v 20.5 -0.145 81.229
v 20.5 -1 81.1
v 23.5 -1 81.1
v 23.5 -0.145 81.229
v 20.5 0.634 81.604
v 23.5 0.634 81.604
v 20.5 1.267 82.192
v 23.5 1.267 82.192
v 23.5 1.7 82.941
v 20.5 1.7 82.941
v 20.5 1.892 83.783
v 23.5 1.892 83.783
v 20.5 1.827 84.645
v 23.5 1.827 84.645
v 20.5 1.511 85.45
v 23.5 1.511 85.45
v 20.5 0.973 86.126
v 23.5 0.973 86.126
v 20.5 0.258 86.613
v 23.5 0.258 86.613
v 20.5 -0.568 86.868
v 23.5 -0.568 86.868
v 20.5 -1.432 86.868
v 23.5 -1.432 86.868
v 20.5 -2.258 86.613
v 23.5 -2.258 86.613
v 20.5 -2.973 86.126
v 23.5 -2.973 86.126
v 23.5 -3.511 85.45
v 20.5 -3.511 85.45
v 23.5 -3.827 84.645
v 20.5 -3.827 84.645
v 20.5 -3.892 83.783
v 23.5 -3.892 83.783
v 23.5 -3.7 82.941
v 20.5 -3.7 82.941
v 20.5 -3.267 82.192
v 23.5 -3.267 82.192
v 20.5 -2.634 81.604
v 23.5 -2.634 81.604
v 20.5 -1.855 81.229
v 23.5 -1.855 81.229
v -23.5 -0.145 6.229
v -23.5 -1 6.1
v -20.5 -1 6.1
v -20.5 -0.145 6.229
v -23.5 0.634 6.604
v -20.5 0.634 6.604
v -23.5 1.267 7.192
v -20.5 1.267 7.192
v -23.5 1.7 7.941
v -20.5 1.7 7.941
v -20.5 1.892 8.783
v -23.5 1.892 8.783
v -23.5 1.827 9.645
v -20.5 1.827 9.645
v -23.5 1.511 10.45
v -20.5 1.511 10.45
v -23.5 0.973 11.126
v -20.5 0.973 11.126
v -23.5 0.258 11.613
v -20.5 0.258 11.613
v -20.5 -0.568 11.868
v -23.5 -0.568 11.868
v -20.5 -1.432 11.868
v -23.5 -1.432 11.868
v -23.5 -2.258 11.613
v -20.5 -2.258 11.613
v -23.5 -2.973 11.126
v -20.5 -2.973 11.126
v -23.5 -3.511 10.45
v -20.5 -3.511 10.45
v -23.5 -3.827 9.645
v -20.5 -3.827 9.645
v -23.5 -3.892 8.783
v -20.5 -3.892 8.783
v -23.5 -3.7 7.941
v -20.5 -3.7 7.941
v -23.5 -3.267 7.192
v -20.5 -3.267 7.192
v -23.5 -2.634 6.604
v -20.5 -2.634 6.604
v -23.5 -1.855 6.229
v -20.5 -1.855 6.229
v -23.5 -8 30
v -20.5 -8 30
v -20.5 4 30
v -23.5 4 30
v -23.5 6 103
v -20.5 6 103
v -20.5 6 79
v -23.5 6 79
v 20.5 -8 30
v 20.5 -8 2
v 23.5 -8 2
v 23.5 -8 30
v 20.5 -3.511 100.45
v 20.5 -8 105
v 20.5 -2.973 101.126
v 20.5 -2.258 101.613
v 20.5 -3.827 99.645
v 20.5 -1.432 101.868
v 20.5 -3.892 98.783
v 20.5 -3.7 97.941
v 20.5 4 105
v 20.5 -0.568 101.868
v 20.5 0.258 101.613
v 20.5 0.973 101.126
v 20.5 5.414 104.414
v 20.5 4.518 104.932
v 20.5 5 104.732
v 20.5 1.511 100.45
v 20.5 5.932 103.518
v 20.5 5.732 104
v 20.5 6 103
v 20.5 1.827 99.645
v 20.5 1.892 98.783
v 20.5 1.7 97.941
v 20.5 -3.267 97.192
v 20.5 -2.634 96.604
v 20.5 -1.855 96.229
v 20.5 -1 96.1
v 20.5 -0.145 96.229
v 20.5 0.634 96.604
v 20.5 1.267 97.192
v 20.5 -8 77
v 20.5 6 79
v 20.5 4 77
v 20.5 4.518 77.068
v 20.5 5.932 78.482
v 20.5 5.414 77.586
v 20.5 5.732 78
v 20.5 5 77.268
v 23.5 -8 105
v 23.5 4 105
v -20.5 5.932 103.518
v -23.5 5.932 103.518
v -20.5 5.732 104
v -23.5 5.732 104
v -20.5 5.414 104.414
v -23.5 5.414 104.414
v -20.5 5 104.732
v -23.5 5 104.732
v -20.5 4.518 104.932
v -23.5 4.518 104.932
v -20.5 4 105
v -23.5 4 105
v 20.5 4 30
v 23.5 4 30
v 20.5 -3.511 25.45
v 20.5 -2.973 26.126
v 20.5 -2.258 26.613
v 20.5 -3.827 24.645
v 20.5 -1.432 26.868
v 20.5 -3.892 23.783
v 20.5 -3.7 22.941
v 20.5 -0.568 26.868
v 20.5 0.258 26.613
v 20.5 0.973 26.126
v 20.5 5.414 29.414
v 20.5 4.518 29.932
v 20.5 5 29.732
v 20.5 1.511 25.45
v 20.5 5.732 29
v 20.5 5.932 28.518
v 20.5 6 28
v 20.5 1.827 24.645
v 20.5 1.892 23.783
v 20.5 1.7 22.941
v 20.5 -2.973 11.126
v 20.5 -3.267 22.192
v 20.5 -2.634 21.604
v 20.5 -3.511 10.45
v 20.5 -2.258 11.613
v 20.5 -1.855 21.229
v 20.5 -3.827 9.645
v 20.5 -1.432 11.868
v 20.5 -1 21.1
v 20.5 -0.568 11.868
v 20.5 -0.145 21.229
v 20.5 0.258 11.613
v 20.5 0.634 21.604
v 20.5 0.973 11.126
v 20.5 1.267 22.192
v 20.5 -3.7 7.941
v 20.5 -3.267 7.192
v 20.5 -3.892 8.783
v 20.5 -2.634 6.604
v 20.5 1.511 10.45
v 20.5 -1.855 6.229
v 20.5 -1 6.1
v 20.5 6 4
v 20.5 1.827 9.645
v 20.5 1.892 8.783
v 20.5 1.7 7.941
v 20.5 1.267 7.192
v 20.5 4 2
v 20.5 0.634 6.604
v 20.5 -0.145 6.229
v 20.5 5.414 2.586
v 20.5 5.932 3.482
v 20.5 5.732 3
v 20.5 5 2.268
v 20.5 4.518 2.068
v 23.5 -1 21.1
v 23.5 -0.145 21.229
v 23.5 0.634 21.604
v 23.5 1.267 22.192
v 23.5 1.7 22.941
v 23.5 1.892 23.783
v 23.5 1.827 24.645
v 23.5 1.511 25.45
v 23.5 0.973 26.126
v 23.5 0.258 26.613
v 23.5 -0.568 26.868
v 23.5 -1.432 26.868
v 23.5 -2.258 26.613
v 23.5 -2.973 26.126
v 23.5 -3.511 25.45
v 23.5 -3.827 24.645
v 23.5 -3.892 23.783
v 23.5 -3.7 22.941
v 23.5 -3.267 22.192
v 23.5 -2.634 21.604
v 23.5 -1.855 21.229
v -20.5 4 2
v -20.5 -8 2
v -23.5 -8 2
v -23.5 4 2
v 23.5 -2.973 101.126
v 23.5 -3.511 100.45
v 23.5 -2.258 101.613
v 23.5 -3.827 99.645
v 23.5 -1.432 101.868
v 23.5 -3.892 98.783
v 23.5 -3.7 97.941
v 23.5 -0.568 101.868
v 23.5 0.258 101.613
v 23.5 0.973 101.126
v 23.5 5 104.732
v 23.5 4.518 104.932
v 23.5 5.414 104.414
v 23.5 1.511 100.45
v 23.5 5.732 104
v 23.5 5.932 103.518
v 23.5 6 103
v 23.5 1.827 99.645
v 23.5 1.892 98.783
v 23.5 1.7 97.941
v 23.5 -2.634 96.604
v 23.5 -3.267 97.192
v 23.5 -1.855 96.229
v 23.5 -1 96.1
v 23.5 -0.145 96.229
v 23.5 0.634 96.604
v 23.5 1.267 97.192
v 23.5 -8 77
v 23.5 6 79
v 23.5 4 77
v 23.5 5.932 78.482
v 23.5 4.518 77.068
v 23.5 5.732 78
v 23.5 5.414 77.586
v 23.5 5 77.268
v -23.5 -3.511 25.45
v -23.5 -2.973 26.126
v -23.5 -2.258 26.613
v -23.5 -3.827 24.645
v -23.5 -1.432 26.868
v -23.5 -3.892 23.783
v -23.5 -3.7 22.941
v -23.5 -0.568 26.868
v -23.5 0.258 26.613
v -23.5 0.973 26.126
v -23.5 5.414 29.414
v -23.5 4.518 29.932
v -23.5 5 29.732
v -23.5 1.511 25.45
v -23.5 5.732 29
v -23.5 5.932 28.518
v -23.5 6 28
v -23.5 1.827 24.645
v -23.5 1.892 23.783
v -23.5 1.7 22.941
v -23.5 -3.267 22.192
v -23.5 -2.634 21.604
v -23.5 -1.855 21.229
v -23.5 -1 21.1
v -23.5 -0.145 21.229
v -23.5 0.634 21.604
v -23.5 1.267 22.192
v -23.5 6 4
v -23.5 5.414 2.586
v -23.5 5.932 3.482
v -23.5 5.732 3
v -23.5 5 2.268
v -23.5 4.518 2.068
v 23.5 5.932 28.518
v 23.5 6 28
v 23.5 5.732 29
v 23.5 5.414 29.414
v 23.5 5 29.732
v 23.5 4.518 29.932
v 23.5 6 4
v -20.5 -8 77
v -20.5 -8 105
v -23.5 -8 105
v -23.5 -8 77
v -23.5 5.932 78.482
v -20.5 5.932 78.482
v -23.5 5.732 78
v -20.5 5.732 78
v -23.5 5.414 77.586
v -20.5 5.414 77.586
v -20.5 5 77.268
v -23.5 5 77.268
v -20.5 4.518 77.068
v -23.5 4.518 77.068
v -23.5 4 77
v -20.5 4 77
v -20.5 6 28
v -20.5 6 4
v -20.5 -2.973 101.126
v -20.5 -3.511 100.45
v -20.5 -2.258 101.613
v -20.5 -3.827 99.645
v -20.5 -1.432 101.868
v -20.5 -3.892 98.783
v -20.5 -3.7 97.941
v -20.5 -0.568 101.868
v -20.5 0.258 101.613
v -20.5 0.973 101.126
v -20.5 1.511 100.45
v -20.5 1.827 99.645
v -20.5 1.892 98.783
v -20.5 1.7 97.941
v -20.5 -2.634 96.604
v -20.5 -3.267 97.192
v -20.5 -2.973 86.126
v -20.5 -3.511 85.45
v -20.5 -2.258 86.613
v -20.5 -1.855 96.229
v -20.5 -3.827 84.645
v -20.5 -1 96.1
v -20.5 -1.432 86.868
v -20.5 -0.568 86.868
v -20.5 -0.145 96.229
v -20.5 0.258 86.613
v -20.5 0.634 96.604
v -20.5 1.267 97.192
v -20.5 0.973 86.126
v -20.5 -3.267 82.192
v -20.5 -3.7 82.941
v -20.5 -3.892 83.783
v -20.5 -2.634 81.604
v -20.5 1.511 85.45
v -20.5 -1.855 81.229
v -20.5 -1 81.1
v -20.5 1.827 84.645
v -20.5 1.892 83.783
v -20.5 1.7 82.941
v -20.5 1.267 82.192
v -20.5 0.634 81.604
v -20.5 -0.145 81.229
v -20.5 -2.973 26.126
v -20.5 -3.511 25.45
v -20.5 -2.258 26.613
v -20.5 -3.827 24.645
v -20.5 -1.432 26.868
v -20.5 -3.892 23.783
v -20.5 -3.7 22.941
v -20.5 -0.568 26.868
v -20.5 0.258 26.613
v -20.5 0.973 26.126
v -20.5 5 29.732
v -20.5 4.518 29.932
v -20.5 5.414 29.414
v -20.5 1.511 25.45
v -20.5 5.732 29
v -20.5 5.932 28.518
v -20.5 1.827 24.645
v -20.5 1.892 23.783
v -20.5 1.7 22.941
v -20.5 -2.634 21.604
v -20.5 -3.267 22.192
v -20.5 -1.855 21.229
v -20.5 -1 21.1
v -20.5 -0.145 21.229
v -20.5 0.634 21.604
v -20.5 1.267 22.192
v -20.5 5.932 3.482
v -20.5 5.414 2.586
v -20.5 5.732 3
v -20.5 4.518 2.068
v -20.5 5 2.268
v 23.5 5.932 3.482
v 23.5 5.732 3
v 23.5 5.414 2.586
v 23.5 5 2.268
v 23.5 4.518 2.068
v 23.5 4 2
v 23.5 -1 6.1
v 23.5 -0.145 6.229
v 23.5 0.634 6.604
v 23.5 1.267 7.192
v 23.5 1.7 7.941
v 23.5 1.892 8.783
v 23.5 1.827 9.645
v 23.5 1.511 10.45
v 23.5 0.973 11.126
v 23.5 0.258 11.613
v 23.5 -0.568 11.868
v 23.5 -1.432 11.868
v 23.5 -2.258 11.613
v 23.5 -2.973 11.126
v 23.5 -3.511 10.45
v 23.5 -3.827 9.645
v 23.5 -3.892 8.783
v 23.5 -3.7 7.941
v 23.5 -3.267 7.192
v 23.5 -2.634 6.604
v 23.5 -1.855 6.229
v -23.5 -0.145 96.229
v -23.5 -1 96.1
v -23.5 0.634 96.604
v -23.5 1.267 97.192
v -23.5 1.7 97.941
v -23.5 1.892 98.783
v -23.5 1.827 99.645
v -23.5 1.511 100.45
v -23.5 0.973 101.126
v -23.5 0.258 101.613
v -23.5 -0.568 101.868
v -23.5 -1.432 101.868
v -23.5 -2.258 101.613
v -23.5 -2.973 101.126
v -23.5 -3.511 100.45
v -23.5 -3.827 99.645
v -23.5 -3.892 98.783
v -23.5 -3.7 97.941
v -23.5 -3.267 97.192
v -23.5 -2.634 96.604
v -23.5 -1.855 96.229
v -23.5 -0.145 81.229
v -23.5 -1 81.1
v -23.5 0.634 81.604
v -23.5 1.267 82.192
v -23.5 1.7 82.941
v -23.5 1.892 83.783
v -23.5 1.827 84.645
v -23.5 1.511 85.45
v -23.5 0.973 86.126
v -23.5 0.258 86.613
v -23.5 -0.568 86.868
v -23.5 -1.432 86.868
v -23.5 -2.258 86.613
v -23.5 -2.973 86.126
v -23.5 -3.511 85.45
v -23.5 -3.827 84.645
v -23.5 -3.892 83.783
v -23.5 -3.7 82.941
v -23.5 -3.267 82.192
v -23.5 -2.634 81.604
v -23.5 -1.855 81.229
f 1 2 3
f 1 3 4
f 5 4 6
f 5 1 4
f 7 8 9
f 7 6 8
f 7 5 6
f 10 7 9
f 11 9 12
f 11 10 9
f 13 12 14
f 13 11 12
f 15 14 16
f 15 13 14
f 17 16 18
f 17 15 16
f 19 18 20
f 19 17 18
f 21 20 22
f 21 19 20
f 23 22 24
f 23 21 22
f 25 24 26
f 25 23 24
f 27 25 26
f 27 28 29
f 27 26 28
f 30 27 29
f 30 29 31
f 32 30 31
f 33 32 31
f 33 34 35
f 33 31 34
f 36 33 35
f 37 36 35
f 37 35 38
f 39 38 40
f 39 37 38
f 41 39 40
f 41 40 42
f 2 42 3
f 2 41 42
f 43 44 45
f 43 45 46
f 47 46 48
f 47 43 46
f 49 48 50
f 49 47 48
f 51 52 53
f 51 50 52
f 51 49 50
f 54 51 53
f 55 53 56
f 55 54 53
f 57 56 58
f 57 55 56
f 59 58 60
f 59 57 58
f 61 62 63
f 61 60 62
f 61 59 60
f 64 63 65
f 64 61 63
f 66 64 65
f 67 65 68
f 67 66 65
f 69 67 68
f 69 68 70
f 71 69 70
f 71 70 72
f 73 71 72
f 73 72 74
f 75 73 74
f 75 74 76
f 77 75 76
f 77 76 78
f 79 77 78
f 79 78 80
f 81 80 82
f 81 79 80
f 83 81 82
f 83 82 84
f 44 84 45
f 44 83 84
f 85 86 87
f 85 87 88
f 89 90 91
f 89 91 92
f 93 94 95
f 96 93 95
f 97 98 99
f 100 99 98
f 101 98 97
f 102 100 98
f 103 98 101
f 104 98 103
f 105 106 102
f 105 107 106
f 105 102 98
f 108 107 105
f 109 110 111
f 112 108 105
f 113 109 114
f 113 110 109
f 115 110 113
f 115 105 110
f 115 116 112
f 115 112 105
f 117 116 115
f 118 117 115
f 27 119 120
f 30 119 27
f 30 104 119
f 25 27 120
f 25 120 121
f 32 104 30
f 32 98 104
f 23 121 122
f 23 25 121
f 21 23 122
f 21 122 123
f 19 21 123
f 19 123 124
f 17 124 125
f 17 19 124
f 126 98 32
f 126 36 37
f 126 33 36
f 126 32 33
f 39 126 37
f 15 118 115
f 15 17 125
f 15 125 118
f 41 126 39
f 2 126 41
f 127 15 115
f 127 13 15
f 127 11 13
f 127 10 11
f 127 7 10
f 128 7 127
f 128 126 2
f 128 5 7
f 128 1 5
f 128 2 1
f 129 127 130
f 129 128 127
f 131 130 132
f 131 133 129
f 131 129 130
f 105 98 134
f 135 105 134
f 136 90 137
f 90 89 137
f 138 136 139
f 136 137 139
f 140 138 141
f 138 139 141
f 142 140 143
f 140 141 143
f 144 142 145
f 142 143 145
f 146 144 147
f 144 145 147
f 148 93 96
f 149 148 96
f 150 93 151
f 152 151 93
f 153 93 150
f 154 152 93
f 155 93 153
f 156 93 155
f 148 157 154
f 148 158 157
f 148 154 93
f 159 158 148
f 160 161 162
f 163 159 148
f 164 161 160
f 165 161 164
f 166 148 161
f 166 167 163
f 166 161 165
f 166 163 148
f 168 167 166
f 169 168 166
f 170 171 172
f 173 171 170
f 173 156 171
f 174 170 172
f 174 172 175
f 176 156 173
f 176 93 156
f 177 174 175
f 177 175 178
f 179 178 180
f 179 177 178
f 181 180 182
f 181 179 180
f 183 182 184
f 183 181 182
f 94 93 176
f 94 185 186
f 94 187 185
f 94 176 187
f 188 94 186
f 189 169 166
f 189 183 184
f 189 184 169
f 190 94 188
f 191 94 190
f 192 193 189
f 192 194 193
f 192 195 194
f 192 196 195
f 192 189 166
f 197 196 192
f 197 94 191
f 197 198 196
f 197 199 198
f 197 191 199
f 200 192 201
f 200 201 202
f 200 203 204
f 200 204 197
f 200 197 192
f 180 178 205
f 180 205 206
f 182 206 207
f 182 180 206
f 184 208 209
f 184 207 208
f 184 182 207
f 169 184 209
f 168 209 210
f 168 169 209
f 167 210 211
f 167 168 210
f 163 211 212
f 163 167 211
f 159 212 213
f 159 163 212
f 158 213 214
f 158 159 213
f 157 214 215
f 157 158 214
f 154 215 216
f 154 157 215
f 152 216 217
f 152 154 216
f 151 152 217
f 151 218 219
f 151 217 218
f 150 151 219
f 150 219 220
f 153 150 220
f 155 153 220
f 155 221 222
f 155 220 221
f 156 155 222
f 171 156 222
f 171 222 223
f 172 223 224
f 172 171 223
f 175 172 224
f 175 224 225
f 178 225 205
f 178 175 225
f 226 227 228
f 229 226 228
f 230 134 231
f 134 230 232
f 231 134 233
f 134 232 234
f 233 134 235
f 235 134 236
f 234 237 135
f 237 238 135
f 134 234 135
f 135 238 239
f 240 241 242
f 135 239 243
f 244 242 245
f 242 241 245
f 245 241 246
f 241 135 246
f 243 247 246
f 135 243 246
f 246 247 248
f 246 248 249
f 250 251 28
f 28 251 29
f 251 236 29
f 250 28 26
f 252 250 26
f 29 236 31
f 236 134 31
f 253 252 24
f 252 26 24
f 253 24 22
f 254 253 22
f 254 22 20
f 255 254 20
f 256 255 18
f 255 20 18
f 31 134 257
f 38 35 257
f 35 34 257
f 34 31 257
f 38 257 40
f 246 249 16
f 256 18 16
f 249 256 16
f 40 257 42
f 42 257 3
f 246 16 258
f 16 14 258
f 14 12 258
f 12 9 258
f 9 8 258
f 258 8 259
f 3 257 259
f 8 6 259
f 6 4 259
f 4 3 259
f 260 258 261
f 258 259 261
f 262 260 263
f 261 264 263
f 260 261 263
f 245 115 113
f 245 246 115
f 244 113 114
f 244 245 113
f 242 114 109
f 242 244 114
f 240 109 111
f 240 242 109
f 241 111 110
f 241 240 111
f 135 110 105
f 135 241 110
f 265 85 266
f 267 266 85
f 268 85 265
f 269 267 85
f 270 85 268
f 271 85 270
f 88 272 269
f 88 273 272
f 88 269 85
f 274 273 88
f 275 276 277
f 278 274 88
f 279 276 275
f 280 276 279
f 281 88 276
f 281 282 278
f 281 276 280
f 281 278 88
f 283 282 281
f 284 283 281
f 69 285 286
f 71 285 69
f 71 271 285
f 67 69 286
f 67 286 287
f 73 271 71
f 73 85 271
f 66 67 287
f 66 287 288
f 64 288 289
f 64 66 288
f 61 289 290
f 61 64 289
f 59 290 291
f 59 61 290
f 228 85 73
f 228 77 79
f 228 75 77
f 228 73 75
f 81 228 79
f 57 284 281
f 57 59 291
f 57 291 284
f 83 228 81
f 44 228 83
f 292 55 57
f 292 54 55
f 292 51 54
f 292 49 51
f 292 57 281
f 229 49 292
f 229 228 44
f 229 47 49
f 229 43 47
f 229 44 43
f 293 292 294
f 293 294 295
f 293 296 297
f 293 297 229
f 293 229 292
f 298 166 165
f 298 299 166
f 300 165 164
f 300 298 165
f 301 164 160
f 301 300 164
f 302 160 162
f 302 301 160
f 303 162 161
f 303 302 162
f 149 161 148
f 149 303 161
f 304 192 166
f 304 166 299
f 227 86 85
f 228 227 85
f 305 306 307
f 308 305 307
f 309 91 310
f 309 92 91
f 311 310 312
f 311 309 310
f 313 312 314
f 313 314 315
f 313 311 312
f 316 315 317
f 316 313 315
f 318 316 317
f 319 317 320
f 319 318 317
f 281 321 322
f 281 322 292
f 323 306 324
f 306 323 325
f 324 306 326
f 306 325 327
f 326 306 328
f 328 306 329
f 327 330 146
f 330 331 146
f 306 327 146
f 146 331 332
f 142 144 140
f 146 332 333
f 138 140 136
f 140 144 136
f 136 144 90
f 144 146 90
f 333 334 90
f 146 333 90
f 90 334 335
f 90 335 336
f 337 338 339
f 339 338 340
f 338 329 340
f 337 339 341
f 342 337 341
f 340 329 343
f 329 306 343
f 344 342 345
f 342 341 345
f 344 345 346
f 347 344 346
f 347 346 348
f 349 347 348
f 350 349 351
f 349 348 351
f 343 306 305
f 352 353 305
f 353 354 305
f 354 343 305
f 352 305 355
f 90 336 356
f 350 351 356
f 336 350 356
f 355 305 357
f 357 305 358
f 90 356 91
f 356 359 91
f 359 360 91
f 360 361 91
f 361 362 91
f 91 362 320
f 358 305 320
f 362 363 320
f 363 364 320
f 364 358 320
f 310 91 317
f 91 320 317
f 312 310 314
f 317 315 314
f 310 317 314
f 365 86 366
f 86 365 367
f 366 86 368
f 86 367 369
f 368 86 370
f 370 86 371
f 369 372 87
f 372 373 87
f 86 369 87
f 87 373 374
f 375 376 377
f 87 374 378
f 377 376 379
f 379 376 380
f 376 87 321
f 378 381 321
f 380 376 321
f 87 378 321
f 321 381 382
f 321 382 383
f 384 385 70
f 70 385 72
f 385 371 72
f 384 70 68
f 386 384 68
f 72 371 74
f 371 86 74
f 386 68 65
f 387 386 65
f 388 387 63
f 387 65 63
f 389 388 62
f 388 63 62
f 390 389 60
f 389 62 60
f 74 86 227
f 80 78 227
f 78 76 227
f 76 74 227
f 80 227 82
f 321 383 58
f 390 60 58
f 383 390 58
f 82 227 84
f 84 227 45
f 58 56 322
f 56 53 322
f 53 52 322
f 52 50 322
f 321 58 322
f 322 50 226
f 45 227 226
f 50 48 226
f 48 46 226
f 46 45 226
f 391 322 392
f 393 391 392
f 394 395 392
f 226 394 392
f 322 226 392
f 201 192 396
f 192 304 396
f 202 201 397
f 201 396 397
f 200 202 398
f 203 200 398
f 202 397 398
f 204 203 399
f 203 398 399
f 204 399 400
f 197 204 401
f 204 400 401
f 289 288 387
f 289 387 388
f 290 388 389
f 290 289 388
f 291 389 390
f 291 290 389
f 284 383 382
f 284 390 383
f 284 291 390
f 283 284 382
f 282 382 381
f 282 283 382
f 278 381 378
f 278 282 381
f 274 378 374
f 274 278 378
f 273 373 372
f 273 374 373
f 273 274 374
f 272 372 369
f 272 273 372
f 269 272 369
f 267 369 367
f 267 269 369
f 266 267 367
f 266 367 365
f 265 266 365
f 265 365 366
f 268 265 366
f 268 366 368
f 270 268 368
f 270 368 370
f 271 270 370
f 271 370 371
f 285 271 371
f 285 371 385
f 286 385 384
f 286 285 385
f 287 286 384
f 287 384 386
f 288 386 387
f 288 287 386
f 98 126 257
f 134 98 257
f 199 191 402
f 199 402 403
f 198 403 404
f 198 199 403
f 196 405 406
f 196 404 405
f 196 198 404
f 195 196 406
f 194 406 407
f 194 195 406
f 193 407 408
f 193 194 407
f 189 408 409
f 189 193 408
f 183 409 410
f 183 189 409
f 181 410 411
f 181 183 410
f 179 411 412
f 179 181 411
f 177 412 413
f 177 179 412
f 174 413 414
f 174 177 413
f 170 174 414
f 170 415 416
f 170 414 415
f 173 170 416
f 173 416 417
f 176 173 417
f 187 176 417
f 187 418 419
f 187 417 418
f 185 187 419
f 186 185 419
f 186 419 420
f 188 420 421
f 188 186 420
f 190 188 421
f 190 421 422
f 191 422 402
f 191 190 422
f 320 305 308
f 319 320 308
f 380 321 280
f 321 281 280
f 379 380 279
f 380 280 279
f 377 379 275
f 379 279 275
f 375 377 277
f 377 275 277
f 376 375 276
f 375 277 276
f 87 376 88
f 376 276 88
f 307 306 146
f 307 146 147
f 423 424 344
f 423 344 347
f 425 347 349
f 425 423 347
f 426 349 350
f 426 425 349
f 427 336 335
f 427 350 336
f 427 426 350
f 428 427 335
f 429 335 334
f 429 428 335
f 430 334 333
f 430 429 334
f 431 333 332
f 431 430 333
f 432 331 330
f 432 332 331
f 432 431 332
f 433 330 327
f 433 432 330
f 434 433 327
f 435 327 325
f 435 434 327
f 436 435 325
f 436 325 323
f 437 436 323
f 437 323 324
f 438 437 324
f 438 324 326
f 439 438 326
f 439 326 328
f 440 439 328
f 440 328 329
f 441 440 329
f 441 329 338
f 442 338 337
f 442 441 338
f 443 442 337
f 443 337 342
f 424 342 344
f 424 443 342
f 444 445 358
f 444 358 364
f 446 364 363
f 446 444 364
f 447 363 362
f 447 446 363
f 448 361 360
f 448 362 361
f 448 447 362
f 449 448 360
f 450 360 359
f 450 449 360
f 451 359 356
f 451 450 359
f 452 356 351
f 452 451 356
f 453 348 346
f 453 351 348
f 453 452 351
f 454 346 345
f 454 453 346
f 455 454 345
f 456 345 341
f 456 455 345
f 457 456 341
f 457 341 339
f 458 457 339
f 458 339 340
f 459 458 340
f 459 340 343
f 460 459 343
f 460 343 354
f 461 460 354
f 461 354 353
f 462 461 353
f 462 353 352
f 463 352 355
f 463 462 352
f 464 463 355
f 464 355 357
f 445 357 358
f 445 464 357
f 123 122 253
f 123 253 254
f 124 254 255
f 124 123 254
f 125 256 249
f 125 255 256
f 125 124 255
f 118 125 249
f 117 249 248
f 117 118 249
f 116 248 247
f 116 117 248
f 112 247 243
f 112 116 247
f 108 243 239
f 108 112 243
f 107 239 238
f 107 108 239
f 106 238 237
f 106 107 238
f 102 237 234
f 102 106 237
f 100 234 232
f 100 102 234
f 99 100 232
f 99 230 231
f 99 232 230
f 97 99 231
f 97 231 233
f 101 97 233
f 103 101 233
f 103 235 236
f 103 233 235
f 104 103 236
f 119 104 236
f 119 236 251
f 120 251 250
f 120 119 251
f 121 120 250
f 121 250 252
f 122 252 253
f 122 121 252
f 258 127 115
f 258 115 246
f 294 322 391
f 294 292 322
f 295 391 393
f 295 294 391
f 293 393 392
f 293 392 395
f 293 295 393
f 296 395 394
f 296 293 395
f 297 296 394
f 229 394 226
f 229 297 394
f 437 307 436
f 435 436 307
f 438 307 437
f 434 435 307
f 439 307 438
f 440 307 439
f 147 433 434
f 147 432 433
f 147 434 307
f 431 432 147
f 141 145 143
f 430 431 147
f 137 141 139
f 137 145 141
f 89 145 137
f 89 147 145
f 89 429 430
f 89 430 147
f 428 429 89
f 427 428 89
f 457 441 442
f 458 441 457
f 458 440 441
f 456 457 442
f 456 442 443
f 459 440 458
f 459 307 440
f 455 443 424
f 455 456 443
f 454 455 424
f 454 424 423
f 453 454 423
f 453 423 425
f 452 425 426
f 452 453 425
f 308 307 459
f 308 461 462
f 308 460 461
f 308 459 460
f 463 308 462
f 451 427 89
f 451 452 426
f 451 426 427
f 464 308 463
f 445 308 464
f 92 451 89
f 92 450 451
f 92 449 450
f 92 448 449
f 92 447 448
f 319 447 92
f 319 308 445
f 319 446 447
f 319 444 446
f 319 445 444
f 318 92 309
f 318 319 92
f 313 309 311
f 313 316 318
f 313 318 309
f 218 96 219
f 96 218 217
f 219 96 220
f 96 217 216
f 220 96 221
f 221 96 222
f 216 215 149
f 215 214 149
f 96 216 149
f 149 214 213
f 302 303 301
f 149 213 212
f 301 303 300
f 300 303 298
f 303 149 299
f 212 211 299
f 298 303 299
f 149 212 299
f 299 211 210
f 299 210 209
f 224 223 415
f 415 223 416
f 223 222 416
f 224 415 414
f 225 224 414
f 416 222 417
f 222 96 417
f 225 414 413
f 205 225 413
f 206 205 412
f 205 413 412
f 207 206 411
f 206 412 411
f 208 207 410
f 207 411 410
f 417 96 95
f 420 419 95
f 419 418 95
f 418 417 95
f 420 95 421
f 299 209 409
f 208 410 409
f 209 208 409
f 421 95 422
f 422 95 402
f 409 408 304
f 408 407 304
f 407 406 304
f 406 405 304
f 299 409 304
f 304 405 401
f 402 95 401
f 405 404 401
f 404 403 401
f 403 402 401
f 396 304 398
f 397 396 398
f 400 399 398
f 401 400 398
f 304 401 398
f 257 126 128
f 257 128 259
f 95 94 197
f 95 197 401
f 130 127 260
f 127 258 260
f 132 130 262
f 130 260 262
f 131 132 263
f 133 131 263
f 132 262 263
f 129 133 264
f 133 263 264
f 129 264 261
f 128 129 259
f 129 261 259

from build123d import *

# Parameters (mm, degrees)
CYLINDER001_R     = 2.9
CYLINDER001_DEPTH = 100
ARRAY002_Z_COUNT  = 10
ARRAY002_Z_PITCH  = 15
BOX004_W          = 3
BOX004_H          = 14
BOX004_DEPTH      = 28
FILLET002_R       = 2
ARRAY001_Z_COUNT  = 2
ARRAY001_Z_PITCH  = 75


with BuildPart() as side_hole_array:
    # Cylinder001 → Cylinder001 (new body)
    with BuildSketch(Plane(origin=(-50, 0, 0), x_dir=(0, 0, -1), z_dir=(1, 0, 0))):
        Circle(CYLINDER001_R)
    extrude(amount=CYLINDER001_DEPTH)

    # Array002 Z: side hole array ×10


with BuildPart() as side_hole_array_1:
    add(side_hole_array.part)
    with Locations(*[(0, 0, i * ARRAY002_Z_PITCH) for i in range(1, ARRAY002_Z_COUNT)]):
        add(side_hole_array.part)


with BuildPart() as side_hole_array_2:
    # Array002 placement: moved
    add(side_hole_array_1.part.moved(Location((0, -1, 9))))


with BuildPart() as holder_side_fillet:
    # Box004 → Box004 (new body)
    with BuildSketch(Plane(origin=(20.5, -8, 0), x_dir=(1, 0, 0), z_dir=(0, 0, 1))):
        with Locations((1.5, 7)):
            Rectangle(BOX004_W, BOX004_H)
    extrude(amount=BOX004_DEPTH)

    # Fillet002
    fillet002_edges = [holder_side_fillet.edges().sort_by_distance(p)[0] for p in [
        (22, 6, 0),
        (22, 6, 28),
    ]]
    fillet(fillet002_edges, radius=FILLET002_R)


with BuildPart() as sides_with_holes:
    # Part__Mirroring002: instance of holder side fillet
    add(holder_side_fillet.part.mirror(Plane(origin=(0, 0, 0), x_dir=(0, -1, 0), z_dir=(1, 0, 0))))

    # Fusion001: union holder side fillet
    add(holder_side_fillet.part)

    # Array001 Z: sides with holes ×2


with BuildPart() as sides_with_holes_1:
    add(sides_with_holes.part)
    with Locations(*[(0, 0, i * ARRAY001_Z_PITCH) for i in range(1, ARRAY001_Z_COUNT)]):
        add(sides_with_holes.part)


with BuildPart() as sides_with_holes_2:
    # Array001 placement: moved
    add(sides_with_holes_1.part.moved(Location((0, 0, 2))))

    # Cut001: cut side hole array
    add(side_hole_array_2.part, mode=Mode.SUBTRACT)


solid = sides_with_holes_2.part
